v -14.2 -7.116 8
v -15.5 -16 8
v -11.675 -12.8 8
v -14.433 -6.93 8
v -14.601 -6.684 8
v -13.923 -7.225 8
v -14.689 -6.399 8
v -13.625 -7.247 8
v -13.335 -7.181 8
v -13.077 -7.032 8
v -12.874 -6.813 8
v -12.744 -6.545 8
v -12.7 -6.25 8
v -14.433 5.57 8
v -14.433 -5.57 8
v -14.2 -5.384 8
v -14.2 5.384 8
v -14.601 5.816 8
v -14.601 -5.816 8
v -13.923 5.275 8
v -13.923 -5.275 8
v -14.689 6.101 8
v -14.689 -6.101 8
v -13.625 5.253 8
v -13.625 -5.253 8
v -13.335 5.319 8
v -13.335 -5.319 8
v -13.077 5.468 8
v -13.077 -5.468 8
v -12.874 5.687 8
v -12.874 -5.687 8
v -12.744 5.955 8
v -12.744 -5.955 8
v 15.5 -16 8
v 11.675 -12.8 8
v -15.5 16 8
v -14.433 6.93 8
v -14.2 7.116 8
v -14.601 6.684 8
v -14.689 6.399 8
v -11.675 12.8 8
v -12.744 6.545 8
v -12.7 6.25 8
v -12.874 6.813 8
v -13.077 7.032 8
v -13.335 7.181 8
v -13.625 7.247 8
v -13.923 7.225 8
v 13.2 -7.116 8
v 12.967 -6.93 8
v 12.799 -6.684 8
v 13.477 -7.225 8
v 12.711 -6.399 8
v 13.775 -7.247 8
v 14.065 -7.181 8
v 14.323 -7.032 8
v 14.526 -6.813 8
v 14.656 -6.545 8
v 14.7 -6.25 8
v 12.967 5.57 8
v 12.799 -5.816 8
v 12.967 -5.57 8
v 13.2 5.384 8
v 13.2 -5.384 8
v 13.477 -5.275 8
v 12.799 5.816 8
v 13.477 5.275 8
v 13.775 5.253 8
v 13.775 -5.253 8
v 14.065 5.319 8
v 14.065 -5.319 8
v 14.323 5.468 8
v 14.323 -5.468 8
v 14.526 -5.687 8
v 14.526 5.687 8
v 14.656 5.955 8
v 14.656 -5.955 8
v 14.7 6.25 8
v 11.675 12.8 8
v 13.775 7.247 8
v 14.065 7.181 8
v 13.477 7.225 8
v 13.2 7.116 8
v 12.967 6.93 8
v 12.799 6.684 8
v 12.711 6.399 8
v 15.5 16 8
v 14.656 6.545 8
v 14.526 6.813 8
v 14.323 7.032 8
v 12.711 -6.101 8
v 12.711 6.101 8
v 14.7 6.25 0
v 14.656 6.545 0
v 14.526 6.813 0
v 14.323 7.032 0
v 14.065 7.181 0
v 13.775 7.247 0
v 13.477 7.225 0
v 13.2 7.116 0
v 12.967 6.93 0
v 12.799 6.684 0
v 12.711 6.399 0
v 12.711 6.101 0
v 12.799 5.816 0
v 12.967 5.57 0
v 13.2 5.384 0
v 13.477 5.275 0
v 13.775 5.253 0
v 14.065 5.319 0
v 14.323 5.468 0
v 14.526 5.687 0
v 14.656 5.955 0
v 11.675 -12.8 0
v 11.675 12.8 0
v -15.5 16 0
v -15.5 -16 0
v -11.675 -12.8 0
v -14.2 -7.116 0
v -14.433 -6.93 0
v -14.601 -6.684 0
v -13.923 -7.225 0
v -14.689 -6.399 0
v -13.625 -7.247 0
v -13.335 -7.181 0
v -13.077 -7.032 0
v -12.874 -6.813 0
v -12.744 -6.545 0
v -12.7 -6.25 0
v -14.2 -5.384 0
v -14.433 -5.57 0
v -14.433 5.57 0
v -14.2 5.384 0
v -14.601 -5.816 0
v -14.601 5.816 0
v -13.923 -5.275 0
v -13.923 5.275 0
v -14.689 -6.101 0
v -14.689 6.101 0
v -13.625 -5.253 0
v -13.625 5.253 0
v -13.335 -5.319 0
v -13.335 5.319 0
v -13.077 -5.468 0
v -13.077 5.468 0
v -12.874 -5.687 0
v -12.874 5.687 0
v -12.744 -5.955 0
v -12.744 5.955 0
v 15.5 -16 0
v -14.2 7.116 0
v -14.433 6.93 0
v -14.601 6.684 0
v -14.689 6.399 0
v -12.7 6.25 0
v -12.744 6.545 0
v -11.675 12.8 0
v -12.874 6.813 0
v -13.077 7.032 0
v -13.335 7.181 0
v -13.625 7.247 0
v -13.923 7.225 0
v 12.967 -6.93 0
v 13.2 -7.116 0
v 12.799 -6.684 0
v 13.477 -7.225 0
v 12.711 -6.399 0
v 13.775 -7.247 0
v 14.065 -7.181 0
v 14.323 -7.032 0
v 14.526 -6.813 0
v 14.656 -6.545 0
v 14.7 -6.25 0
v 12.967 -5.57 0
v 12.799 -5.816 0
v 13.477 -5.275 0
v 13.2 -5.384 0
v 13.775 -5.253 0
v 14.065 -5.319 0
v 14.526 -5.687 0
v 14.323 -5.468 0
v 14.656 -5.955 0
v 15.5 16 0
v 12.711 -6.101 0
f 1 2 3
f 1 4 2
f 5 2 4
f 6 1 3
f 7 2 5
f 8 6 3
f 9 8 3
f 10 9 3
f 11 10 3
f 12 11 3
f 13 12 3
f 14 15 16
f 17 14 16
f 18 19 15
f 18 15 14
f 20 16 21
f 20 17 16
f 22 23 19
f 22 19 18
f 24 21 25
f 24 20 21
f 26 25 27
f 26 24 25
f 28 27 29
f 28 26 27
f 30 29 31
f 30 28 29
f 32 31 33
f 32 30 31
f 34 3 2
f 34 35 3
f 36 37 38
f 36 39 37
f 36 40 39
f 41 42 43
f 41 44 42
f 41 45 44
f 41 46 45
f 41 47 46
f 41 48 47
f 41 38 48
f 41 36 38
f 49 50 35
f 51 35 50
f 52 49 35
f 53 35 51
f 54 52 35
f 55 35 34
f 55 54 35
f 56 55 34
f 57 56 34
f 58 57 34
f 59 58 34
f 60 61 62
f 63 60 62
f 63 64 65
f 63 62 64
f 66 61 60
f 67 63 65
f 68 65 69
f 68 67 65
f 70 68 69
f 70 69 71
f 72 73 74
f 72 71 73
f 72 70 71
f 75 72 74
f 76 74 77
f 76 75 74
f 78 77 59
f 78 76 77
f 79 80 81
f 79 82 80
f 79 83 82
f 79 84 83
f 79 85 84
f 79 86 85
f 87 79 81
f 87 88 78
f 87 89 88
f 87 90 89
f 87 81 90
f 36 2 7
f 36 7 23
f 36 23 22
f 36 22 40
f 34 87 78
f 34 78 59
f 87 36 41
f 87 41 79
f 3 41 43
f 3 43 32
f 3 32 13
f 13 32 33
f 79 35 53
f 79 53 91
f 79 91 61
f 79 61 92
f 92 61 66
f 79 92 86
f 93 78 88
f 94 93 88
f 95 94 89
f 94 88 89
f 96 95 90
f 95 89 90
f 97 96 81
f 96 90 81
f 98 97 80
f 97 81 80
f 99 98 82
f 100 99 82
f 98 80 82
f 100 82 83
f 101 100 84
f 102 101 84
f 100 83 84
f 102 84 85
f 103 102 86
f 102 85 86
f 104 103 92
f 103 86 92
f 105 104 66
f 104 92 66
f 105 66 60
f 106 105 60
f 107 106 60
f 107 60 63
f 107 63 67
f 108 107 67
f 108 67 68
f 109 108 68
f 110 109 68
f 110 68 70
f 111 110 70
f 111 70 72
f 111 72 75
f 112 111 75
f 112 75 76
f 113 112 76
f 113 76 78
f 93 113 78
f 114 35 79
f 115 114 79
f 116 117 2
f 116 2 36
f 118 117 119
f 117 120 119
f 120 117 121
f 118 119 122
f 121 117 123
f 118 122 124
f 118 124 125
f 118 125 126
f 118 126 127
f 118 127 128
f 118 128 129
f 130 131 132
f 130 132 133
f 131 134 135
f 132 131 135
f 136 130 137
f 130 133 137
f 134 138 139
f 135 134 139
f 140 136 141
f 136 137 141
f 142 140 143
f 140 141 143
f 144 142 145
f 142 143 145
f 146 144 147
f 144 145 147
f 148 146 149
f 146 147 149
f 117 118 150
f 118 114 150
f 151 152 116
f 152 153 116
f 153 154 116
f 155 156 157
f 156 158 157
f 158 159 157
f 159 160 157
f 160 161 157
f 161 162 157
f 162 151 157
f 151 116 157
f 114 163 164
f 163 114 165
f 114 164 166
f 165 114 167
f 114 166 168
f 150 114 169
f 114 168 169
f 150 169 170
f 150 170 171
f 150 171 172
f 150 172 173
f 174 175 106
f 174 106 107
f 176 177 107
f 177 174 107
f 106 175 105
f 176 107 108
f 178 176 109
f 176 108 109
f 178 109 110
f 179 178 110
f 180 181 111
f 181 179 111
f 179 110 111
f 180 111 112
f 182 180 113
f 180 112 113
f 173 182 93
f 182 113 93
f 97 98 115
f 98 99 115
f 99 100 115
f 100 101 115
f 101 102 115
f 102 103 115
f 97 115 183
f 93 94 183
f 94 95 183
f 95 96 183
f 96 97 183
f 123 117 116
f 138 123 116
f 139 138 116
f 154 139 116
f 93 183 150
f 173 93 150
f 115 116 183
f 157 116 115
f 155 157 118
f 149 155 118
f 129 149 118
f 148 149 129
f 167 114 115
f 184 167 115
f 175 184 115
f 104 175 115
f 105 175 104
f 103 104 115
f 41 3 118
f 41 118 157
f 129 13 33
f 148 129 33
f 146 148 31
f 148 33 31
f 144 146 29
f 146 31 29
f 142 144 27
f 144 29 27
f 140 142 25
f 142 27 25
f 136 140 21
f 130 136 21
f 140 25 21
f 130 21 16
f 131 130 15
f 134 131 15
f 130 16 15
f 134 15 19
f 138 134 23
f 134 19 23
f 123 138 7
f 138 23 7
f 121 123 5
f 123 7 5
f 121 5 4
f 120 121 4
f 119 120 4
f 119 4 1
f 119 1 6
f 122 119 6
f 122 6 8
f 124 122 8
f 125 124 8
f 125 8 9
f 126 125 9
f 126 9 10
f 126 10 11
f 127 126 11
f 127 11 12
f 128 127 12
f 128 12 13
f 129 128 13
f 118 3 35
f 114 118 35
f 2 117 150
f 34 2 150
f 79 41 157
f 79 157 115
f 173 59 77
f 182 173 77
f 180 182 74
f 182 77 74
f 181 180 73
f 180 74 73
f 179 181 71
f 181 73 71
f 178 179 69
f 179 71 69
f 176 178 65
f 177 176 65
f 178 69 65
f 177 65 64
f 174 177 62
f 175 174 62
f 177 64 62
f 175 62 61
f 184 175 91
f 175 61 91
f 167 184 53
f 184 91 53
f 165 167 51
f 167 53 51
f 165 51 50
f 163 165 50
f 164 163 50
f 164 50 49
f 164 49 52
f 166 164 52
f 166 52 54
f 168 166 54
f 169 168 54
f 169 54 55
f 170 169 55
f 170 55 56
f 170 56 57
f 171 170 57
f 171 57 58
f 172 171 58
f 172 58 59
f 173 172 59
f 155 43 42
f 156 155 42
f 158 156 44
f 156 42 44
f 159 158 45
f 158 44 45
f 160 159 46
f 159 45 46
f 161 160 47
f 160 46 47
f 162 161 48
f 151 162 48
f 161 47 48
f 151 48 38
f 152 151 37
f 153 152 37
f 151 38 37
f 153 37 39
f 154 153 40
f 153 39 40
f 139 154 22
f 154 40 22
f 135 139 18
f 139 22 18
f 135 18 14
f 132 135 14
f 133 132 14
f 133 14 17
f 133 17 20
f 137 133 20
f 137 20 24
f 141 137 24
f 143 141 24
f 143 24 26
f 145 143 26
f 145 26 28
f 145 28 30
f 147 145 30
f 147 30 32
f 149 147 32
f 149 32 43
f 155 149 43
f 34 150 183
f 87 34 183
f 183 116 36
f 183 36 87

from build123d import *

# Parameters (mm, degrees)
SKETCH1_W           = 31
SKETCH1_H           = 32
BOSS_EXTRUDE1_DEPTH = 8
SKETCH2_W           = 23.35
SKETCH2_H           = 25.6
CUT_EXTRUDE1_DEPTH  = 13
SKETCH3_R           = 1
CUT_EXTRUDE2_DEPTH  = 10


with BuildPart() as part:
    # Sketch1 → Boss-Extrude1 (new body)
    with BuildSketch(Plane.XY):
        Rectangle(SKETCH1_W, SKETCH1_H)
    extrude(amount=BOSS_EXTRUDE1_DEPTH)

    # Sketch2 → Cut-Extrude1 (cut)
    with BuildSketch(Plane.XY.offset(8)):
        Rectangle(SKETCH2_W, SKETCH2_H)
    extrude(amount=-CUT_EXTRUDE1_DEPTH, mode=Mode.SUBTRACT)

    # Sketch3 → Cut-Extrude2 (cut)
    with BuildSketch(Plane.XY.offset(8)):
        with Locations((13.7, 6.25)):
            Circle(SKETCH3_R)
        with Locations((13.7, -6.25)):
            Circle(SKETCH3_R)
        with Locations((-13.7, -6.25)):
            Circle(SKETCH3_R)
        with Locations((-13.7, 6.25)):
            Circle(SKETCH3_R)
    extrude(amount=-CUT_EXTRUDE2_DEPTH, mode=Mode.SUBTRACT)


solid = part.part
